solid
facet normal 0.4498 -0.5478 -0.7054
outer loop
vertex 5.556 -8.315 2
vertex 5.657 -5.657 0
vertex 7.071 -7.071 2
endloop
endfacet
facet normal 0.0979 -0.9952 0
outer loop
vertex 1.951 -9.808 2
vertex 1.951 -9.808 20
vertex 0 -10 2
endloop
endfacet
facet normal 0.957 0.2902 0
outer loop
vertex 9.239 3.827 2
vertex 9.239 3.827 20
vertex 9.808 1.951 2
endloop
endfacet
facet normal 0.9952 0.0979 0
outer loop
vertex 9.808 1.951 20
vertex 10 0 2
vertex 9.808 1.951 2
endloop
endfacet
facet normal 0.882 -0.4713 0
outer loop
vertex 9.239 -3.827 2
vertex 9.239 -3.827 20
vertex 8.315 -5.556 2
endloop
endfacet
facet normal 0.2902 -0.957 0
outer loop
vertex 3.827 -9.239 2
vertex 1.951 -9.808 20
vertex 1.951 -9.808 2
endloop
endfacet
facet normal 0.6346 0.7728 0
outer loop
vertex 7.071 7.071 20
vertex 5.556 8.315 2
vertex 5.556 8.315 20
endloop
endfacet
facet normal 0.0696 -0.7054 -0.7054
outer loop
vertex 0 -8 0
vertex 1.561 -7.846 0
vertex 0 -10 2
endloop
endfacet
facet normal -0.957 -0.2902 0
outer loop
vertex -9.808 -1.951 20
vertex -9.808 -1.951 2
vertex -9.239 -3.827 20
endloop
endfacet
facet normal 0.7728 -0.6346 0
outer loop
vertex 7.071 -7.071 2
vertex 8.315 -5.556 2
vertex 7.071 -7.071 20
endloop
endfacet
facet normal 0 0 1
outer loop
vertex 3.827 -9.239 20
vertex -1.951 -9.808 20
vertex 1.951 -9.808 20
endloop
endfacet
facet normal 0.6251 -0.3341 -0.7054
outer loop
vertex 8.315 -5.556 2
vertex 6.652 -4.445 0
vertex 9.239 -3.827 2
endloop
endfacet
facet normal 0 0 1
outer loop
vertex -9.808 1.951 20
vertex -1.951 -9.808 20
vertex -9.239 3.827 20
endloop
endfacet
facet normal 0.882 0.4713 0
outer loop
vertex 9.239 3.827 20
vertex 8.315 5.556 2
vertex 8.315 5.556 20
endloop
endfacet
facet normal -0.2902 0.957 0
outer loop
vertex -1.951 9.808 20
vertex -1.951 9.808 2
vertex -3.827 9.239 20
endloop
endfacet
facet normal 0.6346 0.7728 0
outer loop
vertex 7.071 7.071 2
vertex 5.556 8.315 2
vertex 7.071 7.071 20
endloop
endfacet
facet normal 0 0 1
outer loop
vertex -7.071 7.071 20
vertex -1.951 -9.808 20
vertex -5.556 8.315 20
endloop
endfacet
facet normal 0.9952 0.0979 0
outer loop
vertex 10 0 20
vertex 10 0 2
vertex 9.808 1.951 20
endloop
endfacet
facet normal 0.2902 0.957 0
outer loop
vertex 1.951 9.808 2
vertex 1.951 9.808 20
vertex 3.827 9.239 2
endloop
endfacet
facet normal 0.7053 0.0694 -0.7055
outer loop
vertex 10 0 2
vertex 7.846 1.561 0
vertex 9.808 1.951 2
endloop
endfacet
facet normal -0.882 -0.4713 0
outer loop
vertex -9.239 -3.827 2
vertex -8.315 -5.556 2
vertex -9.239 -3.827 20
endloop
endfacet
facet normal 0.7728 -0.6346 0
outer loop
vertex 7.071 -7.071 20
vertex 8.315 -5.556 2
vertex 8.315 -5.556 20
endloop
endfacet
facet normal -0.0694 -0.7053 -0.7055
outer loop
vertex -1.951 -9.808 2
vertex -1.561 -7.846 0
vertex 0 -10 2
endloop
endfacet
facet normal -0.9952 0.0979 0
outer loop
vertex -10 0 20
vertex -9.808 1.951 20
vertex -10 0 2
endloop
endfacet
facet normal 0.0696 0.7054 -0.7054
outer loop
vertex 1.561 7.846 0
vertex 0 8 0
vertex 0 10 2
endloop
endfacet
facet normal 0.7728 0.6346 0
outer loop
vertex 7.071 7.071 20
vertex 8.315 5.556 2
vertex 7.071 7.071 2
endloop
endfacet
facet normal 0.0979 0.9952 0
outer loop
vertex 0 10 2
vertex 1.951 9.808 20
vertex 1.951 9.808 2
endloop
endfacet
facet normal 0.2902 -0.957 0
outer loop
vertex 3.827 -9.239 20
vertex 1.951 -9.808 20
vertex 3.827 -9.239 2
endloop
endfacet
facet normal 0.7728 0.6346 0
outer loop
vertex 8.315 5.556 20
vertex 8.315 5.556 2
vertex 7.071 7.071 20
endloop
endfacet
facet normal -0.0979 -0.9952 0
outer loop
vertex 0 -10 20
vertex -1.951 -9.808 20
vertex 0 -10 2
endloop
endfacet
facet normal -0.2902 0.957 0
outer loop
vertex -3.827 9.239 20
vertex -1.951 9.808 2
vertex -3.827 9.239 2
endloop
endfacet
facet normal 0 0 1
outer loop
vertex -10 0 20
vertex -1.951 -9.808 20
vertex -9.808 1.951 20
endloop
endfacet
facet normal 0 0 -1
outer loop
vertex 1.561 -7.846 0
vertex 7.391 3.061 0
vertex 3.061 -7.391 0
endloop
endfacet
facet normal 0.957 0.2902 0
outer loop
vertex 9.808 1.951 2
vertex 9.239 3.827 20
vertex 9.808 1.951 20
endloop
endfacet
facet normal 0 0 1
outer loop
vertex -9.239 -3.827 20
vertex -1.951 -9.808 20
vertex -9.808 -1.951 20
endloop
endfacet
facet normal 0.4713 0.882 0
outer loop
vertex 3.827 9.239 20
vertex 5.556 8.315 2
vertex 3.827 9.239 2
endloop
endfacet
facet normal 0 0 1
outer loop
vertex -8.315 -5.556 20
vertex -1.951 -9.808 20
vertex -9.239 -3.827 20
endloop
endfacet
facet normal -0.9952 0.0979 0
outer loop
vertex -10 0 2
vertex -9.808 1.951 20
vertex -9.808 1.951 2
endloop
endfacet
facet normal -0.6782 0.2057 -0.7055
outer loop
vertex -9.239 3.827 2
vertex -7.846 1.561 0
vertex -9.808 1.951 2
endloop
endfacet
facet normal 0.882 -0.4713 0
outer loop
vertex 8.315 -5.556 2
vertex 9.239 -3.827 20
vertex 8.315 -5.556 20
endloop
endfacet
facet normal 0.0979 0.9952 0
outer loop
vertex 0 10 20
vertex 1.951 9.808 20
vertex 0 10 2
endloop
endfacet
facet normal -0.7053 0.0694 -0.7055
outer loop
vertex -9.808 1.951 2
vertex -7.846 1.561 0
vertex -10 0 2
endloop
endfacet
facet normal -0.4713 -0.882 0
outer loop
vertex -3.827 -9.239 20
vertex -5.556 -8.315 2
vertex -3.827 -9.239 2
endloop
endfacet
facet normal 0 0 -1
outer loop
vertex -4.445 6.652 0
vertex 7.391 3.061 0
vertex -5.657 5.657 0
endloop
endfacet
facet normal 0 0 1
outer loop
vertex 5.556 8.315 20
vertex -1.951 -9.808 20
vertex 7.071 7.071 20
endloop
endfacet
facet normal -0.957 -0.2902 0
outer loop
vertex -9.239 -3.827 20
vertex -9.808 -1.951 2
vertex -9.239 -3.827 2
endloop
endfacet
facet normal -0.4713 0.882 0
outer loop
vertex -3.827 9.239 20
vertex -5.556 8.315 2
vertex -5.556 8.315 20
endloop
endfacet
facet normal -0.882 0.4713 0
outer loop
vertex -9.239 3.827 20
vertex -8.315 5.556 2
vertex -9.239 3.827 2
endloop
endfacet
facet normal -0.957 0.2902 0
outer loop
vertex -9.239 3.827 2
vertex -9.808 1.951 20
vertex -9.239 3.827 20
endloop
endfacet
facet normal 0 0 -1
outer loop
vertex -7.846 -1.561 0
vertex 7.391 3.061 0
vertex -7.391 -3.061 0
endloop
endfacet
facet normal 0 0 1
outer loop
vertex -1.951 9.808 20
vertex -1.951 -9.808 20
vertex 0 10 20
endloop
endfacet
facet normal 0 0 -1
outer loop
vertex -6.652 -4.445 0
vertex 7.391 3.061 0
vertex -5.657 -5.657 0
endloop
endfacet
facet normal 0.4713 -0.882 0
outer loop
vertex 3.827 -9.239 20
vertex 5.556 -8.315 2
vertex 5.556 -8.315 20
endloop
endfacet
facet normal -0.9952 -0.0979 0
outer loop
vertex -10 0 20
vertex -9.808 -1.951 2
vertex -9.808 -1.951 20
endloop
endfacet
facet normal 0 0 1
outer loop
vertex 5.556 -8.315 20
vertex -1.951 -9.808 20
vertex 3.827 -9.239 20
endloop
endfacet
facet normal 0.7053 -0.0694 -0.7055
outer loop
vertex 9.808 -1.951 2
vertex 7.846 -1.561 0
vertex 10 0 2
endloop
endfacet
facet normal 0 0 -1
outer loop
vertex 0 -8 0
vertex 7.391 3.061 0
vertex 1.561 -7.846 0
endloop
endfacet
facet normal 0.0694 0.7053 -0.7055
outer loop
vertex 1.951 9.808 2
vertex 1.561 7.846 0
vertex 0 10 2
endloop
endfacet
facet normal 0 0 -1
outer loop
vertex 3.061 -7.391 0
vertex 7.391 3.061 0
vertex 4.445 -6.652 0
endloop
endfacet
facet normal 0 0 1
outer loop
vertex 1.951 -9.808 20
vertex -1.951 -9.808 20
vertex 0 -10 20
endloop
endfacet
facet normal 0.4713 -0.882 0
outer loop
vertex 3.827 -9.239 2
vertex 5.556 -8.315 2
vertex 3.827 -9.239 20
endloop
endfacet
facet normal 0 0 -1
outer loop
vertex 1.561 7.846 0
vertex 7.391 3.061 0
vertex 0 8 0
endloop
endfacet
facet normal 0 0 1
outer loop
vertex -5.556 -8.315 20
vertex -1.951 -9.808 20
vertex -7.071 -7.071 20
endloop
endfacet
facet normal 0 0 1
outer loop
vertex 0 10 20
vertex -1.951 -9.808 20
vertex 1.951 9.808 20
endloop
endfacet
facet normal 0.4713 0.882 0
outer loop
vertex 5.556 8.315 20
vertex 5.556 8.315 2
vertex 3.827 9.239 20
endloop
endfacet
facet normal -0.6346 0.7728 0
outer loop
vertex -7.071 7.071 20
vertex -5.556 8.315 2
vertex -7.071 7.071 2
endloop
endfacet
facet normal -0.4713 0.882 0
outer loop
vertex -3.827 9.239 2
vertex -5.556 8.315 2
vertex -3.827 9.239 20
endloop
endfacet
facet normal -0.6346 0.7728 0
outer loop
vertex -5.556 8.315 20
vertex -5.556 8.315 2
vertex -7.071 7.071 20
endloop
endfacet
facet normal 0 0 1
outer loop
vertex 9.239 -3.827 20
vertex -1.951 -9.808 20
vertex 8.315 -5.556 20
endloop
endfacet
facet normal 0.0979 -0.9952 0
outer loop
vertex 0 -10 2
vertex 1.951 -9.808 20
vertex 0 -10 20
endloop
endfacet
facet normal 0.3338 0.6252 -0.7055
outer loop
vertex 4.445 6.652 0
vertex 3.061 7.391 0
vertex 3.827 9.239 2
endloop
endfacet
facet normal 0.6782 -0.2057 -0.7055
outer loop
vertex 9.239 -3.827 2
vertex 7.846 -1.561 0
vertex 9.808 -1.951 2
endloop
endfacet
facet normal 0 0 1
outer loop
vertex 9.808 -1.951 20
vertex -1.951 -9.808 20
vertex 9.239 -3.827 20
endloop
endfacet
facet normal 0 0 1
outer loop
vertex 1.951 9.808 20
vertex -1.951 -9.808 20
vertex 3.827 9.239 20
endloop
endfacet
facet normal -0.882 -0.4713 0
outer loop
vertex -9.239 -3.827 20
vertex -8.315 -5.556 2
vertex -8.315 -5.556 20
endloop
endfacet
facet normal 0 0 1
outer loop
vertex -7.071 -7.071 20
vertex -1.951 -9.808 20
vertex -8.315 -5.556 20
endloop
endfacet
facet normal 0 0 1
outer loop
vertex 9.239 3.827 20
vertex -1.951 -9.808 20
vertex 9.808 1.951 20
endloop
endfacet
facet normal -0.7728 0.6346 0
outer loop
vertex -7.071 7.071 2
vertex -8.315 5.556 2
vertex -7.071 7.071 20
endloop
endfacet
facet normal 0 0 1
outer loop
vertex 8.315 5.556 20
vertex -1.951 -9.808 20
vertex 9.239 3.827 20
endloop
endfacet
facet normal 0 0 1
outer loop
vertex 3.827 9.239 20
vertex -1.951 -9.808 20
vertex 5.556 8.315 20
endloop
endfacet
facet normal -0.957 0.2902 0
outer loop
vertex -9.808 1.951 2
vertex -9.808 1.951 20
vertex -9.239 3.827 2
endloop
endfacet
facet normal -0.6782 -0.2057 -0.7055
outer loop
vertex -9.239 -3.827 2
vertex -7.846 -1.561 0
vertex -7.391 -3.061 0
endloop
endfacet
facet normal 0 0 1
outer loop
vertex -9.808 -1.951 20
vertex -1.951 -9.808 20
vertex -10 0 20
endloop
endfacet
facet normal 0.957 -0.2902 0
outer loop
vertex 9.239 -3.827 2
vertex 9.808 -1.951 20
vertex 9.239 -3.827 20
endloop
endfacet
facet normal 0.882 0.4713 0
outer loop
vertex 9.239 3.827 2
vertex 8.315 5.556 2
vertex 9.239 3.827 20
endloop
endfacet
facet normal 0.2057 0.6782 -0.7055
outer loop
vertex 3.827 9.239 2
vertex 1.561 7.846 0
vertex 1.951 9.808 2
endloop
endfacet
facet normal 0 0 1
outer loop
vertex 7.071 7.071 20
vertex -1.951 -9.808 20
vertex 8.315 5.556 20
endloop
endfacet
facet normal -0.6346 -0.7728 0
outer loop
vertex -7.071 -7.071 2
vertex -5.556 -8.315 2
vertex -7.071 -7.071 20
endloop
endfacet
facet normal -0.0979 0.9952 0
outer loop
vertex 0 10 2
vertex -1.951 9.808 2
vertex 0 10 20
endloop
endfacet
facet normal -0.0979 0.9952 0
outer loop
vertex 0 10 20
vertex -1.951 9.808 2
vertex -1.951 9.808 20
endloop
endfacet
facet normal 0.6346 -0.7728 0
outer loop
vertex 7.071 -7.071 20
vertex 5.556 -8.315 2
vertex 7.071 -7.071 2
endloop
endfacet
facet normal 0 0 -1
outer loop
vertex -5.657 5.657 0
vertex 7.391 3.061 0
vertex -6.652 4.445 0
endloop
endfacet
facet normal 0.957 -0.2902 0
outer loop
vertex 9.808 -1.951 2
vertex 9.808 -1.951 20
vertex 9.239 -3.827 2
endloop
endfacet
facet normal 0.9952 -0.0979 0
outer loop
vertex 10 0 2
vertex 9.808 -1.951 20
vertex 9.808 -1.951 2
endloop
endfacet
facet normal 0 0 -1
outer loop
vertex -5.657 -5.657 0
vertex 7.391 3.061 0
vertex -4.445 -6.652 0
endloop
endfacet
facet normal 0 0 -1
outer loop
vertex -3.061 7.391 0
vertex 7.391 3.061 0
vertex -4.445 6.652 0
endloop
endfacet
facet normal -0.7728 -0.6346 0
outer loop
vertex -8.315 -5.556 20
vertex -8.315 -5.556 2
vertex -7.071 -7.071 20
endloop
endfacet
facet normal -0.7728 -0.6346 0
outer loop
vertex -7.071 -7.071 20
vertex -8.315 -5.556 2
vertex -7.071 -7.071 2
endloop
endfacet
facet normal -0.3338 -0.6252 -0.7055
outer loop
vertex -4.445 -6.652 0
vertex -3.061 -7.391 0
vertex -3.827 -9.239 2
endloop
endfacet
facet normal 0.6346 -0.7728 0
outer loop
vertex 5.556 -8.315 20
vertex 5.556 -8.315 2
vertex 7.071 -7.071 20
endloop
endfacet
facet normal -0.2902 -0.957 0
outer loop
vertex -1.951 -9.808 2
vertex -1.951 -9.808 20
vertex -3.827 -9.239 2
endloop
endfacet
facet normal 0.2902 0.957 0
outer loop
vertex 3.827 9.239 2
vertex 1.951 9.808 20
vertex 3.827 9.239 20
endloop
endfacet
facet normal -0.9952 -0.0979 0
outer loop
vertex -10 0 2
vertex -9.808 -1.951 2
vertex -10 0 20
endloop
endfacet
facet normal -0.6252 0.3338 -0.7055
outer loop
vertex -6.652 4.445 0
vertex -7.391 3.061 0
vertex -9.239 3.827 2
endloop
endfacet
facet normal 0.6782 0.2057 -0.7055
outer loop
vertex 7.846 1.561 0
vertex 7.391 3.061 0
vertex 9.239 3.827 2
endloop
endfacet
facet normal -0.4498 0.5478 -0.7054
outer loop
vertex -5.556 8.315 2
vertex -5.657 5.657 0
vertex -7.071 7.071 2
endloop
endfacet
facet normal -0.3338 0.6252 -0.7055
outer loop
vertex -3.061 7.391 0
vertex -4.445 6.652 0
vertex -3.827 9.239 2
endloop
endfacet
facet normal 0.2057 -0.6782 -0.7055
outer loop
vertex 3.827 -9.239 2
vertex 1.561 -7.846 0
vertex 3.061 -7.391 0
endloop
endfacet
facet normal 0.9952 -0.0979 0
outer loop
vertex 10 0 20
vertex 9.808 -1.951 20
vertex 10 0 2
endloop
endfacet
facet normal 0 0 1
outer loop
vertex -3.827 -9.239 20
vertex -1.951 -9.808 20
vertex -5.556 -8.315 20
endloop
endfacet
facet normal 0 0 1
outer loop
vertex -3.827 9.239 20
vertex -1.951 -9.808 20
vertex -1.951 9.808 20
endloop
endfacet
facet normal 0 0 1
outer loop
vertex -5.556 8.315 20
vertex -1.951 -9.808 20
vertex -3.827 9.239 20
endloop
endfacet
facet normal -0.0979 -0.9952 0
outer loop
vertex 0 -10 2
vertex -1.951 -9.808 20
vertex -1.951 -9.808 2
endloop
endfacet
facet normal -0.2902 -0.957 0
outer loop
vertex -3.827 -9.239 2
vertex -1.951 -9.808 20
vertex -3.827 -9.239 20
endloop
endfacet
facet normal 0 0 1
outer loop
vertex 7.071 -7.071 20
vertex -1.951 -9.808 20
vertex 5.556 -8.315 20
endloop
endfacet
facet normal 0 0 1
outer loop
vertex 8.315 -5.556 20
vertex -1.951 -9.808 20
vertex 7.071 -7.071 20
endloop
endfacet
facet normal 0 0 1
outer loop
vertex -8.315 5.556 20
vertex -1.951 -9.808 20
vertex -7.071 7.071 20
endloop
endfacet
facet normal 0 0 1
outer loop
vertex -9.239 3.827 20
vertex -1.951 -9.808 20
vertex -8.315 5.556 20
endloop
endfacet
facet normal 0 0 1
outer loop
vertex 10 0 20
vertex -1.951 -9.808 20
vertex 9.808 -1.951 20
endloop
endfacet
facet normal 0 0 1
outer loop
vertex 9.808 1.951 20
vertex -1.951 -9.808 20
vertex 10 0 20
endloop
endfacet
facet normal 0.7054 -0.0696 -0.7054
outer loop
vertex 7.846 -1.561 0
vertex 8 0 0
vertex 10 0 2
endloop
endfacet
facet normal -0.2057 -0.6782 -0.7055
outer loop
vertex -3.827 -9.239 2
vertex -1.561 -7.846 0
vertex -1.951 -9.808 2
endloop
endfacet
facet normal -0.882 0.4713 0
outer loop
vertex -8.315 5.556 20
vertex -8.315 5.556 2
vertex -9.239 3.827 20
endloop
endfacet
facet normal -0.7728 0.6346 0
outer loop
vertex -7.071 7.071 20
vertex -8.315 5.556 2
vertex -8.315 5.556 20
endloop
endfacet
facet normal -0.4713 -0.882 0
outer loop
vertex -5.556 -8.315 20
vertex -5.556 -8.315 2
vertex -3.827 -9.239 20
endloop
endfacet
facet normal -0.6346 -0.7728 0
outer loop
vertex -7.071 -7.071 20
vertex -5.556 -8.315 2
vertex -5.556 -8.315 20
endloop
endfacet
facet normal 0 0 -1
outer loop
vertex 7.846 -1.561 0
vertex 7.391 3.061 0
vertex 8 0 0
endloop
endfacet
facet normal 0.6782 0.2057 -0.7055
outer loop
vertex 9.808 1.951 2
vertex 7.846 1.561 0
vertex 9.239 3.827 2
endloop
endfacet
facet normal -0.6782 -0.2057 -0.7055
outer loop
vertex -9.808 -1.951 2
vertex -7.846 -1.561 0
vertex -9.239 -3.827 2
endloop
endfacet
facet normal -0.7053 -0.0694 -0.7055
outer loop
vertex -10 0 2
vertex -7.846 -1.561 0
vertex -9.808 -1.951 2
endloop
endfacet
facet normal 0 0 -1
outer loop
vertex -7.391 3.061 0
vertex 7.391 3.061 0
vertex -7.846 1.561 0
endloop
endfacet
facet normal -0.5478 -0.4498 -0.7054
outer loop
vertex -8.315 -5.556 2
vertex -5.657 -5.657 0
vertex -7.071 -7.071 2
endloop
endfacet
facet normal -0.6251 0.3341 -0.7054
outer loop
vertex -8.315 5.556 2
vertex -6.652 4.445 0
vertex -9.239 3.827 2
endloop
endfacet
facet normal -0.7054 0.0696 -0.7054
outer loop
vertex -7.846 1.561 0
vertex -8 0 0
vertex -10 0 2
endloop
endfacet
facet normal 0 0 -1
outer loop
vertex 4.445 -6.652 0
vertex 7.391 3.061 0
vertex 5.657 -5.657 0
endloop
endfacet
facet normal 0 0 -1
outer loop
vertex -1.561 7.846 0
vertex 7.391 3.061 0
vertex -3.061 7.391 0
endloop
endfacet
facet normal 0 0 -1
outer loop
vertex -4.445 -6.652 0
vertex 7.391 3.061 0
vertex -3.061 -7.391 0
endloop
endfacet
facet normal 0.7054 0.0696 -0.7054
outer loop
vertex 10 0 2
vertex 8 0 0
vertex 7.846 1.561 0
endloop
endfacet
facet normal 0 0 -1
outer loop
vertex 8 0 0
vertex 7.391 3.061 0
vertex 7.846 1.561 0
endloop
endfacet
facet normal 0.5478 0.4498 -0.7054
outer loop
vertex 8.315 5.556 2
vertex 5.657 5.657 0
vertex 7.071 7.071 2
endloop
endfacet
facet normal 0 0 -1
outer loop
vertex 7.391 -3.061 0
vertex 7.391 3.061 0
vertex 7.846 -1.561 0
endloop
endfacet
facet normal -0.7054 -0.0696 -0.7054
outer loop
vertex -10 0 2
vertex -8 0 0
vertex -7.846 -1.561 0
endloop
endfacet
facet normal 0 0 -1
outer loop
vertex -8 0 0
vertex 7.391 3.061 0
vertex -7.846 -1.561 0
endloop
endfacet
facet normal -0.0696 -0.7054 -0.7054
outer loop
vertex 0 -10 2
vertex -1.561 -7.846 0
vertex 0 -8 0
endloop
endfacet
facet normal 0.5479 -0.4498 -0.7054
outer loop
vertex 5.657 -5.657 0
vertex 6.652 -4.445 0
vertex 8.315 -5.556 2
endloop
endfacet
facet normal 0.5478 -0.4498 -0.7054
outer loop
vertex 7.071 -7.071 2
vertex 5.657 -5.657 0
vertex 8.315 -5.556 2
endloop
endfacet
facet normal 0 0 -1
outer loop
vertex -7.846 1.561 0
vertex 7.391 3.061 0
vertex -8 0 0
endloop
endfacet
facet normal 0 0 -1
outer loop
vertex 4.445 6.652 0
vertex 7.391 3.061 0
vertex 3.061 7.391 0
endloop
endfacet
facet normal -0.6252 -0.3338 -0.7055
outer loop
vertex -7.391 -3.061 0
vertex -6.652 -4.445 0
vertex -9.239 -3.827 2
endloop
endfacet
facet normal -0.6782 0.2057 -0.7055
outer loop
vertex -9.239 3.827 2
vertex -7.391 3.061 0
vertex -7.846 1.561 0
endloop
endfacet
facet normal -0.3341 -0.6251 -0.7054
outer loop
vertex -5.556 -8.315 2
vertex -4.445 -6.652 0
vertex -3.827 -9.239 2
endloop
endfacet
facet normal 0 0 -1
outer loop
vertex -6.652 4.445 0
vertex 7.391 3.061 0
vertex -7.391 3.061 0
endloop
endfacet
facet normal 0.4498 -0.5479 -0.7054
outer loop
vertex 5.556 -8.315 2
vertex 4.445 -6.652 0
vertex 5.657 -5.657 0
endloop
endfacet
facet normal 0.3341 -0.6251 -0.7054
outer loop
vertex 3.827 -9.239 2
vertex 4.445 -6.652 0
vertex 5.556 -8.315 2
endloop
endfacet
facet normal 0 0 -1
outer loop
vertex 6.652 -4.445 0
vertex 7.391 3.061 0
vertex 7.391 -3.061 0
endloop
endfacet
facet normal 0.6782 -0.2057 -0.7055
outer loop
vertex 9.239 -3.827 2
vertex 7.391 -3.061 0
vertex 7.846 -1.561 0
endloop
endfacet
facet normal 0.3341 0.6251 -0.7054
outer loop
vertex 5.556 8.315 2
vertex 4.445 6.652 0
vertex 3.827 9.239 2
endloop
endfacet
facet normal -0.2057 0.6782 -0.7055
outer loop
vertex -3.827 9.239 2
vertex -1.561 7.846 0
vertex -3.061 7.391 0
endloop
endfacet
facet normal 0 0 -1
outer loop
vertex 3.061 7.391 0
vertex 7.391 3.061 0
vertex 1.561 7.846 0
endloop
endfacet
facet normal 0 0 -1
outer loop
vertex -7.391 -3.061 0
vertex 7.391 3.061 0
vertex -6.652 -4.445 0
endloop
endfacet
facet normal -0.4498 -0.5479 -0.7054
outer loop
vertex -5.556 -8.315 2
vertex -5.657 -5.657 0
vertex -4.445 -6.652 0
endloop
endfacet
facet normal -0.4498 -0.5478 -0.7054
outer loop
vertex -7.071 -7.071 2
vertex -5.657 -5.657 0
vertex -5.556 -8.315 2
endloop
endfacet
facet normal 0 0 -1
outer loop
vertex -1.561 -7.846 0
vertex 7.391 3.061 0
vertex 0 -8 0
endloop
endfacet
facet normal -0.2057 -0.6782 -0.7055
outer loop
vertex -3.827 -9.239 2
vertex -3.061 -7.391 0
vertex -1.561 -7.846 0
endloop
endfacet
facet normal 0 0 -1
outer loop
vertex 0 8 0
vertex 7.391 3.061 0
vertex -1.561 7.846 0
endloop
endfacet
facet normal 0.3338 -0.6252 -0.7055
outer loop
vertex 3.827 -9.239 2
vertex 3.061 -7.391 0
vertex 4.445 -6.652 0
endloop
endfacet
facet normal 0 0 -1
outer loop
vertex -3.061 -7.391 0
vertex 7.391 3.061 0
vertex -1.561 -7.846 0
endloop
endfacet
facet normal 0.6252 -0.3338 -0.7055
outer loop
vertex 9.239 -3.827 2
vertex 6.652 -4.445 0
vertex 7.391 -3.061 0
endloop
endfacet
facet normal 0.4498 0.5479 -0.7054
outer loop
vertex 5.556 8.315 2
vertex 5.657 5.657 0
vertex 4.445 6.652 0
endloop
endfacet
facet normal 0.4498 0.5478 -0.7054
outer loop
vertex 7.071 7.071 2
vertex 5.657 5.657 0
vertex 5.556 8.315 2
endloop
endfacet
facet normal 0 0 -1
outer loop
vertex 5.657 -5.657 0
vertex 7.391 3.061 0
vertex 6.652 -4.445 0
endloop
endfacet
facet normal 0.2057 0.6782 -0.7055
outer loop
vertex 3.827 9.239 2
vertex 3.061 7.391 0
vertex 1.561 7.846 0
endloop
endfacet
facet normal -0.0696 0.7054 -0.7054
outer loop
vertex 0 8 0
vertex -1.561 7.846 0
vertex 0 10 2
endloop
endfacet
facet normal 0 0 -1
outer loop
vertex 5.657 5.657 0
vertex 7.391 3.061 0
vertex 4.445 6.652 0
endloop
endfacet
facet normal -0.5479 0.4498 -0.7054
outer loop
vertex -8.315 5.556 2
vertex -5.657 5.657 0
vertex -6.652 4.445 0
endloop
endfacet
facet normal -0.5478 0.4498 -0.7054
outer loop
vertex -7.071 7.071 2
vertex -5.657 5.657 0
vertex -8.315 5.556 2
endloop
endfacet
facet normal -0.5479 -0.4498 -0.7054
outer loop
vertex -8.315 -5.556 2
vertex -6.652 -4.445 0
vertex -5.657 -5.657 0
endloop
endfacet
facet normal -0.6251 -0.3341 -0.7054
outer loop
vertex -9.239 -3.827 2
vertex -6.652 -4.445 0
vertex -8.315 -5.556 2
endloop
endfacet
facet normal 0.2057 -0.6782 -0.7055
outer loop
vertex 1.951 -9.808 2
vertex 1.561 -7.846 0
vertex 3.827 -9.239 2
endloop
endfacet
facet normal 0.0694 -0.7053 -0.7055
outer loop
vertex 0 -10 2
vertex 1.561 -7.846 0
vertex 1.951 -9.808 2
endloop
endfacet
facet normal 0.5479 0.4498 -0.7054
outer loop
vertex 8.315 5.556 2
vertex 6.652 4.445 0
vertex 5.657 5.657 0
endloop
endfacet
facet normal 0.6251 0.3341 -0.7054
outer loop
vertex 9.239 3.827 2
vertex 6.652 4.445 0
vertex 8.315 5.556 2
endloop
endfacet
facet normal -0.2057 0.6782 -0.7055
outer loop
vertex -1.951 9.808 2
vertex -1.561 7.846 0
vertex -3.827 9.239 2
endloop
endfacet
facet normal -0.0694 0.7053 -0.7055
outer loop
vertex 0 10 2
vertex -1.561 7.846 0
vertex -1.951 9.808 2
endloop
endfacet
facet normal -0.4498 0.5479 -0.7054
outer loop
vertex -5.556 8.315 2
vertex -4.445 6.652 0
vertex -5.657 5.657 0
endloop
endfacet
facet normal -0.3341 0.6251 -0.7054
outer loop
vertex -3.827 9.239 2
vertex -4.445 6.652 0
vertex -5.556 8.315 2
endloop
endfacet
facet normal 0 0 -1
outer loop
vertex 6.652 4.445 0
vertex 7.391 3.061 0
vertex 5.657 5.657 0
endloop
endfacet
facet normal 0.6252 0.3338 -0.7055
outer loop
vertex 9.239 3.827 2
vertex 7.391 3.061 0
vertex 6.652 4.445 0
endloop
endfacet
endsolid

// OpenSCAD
// A cylinder standing on a chamfer, built the way a printed part is: the hull
// of the wall with a smaller copy of itself.
//
// This is the fixture for two things which only work together.
//
// The hull has to carry the two cylinders its children declared, or the wall
// has no intent behind it and stays faceted however exactly it fits. And the
// rim between the wall and the chamfer is the complete bound of neither face,
// so it can only be collapsed as a rim *shared* by two recognised bands - one
// CIRCLE used by the cylinder and by the cone, once in each direction.
//
// The frustum is the hull's own surface, and since 2026-09-25 the hull says so:
// each operand's declarations state its profile - a cylinder and its two cap
// planes - and the hull of solids of revolution about one axis is the solid of
// revolution of the hull of their profiles, whose one sloped edge runs from the
// r = 8 rim at z = 0 to the r = 10 rim at z = 2. That cone is declared
// (declareHullOfRevolution). Until then the hull declared only the two
// cylinders, and the frustum was identified by its rims and named after one it
// is not on - open item 36, lid10's hoseCollar in ten lines.
//
// Measured, and asserted by the driver: what the exporter has to report for
// the above to have happened. A silently faceted export is still a valid one,
// so validity alone cannot see a recogniser that has stopped recognising.
// EXPECT: 3 analytic surfaces available (2 cylindrical, 0 spherical, 0 toroidal, 0 Bezier, 1 conical)
// EXPECT: 2 surfaces recognised (0 toroidal, 0 spherical, 1 conical, 0 partial), 64 facets replaced
//
// And every one of those 64 is decided by the model - by derivation: 32 wall
// facets on the r = 10 cylinder and 32 on the cone, which the hull declares
// in closed form from its operands' profiles and names each face for from the
// rings its corners are on (hullFacetRecords). A derivation, not a maker's
// word, so D1: until 2026-09-29 they read D0, the positional tagger having
// named them by where their corners were (checklist E8).
// EXPECT: what decided each written facet: 0 D0, 64 D1, 0 D2, 0 D3, 0 D4
//
// One original (the hull), two declared cylinders, and only one of them is
// still here: the r = 8 disc's wall is 0.01 tall and inside the hull's
// profile, so none of it survives. What does survive is the hull's bottom cap,
// whose every corner is on r = 8 - and a presence test asking corners alone
// counts that cap as the disc's wall. It did, once, while ownership was being
// moved from measurement to identity. The cap lies wholly on a declared plane,
// which is the surface it is a facet of. See doc/step-export-wip.md, open
// item 31.
// Since the hull declares its cone there are three curved declarations, and
// the one original owns two of them - the r = 10 wall and the cone - and still
// not the r = 8 disc's. By derivation since 2026-09-29: its faces are named for
// what the rings their corners are on make them, where position named them
// before.
// EXPECT: provenance maps 1 of 1 originals onto 2 of 3 declared surfaces
//
// The hull's profile is (r=8, z=0) to (r=10, z=2) to (r=10, z=20) - the small
// cylinder's top rim at (8, 0.01) is inside that line, so it contributes no
// vertex. Frustum (pi*2/3)(64 + 80 + 100) plus cylinder pi*100*18.
// ROUNDTRIP: Cone=1 Cylinder=1 Plane=2
// VOLUME: 6165.8991814
$fn = 32;
hull() {
  translate([0, 0, 2]) cylinder(h = 18, r = 10);
  cylinder(h = 0.01, r = 8);
}
